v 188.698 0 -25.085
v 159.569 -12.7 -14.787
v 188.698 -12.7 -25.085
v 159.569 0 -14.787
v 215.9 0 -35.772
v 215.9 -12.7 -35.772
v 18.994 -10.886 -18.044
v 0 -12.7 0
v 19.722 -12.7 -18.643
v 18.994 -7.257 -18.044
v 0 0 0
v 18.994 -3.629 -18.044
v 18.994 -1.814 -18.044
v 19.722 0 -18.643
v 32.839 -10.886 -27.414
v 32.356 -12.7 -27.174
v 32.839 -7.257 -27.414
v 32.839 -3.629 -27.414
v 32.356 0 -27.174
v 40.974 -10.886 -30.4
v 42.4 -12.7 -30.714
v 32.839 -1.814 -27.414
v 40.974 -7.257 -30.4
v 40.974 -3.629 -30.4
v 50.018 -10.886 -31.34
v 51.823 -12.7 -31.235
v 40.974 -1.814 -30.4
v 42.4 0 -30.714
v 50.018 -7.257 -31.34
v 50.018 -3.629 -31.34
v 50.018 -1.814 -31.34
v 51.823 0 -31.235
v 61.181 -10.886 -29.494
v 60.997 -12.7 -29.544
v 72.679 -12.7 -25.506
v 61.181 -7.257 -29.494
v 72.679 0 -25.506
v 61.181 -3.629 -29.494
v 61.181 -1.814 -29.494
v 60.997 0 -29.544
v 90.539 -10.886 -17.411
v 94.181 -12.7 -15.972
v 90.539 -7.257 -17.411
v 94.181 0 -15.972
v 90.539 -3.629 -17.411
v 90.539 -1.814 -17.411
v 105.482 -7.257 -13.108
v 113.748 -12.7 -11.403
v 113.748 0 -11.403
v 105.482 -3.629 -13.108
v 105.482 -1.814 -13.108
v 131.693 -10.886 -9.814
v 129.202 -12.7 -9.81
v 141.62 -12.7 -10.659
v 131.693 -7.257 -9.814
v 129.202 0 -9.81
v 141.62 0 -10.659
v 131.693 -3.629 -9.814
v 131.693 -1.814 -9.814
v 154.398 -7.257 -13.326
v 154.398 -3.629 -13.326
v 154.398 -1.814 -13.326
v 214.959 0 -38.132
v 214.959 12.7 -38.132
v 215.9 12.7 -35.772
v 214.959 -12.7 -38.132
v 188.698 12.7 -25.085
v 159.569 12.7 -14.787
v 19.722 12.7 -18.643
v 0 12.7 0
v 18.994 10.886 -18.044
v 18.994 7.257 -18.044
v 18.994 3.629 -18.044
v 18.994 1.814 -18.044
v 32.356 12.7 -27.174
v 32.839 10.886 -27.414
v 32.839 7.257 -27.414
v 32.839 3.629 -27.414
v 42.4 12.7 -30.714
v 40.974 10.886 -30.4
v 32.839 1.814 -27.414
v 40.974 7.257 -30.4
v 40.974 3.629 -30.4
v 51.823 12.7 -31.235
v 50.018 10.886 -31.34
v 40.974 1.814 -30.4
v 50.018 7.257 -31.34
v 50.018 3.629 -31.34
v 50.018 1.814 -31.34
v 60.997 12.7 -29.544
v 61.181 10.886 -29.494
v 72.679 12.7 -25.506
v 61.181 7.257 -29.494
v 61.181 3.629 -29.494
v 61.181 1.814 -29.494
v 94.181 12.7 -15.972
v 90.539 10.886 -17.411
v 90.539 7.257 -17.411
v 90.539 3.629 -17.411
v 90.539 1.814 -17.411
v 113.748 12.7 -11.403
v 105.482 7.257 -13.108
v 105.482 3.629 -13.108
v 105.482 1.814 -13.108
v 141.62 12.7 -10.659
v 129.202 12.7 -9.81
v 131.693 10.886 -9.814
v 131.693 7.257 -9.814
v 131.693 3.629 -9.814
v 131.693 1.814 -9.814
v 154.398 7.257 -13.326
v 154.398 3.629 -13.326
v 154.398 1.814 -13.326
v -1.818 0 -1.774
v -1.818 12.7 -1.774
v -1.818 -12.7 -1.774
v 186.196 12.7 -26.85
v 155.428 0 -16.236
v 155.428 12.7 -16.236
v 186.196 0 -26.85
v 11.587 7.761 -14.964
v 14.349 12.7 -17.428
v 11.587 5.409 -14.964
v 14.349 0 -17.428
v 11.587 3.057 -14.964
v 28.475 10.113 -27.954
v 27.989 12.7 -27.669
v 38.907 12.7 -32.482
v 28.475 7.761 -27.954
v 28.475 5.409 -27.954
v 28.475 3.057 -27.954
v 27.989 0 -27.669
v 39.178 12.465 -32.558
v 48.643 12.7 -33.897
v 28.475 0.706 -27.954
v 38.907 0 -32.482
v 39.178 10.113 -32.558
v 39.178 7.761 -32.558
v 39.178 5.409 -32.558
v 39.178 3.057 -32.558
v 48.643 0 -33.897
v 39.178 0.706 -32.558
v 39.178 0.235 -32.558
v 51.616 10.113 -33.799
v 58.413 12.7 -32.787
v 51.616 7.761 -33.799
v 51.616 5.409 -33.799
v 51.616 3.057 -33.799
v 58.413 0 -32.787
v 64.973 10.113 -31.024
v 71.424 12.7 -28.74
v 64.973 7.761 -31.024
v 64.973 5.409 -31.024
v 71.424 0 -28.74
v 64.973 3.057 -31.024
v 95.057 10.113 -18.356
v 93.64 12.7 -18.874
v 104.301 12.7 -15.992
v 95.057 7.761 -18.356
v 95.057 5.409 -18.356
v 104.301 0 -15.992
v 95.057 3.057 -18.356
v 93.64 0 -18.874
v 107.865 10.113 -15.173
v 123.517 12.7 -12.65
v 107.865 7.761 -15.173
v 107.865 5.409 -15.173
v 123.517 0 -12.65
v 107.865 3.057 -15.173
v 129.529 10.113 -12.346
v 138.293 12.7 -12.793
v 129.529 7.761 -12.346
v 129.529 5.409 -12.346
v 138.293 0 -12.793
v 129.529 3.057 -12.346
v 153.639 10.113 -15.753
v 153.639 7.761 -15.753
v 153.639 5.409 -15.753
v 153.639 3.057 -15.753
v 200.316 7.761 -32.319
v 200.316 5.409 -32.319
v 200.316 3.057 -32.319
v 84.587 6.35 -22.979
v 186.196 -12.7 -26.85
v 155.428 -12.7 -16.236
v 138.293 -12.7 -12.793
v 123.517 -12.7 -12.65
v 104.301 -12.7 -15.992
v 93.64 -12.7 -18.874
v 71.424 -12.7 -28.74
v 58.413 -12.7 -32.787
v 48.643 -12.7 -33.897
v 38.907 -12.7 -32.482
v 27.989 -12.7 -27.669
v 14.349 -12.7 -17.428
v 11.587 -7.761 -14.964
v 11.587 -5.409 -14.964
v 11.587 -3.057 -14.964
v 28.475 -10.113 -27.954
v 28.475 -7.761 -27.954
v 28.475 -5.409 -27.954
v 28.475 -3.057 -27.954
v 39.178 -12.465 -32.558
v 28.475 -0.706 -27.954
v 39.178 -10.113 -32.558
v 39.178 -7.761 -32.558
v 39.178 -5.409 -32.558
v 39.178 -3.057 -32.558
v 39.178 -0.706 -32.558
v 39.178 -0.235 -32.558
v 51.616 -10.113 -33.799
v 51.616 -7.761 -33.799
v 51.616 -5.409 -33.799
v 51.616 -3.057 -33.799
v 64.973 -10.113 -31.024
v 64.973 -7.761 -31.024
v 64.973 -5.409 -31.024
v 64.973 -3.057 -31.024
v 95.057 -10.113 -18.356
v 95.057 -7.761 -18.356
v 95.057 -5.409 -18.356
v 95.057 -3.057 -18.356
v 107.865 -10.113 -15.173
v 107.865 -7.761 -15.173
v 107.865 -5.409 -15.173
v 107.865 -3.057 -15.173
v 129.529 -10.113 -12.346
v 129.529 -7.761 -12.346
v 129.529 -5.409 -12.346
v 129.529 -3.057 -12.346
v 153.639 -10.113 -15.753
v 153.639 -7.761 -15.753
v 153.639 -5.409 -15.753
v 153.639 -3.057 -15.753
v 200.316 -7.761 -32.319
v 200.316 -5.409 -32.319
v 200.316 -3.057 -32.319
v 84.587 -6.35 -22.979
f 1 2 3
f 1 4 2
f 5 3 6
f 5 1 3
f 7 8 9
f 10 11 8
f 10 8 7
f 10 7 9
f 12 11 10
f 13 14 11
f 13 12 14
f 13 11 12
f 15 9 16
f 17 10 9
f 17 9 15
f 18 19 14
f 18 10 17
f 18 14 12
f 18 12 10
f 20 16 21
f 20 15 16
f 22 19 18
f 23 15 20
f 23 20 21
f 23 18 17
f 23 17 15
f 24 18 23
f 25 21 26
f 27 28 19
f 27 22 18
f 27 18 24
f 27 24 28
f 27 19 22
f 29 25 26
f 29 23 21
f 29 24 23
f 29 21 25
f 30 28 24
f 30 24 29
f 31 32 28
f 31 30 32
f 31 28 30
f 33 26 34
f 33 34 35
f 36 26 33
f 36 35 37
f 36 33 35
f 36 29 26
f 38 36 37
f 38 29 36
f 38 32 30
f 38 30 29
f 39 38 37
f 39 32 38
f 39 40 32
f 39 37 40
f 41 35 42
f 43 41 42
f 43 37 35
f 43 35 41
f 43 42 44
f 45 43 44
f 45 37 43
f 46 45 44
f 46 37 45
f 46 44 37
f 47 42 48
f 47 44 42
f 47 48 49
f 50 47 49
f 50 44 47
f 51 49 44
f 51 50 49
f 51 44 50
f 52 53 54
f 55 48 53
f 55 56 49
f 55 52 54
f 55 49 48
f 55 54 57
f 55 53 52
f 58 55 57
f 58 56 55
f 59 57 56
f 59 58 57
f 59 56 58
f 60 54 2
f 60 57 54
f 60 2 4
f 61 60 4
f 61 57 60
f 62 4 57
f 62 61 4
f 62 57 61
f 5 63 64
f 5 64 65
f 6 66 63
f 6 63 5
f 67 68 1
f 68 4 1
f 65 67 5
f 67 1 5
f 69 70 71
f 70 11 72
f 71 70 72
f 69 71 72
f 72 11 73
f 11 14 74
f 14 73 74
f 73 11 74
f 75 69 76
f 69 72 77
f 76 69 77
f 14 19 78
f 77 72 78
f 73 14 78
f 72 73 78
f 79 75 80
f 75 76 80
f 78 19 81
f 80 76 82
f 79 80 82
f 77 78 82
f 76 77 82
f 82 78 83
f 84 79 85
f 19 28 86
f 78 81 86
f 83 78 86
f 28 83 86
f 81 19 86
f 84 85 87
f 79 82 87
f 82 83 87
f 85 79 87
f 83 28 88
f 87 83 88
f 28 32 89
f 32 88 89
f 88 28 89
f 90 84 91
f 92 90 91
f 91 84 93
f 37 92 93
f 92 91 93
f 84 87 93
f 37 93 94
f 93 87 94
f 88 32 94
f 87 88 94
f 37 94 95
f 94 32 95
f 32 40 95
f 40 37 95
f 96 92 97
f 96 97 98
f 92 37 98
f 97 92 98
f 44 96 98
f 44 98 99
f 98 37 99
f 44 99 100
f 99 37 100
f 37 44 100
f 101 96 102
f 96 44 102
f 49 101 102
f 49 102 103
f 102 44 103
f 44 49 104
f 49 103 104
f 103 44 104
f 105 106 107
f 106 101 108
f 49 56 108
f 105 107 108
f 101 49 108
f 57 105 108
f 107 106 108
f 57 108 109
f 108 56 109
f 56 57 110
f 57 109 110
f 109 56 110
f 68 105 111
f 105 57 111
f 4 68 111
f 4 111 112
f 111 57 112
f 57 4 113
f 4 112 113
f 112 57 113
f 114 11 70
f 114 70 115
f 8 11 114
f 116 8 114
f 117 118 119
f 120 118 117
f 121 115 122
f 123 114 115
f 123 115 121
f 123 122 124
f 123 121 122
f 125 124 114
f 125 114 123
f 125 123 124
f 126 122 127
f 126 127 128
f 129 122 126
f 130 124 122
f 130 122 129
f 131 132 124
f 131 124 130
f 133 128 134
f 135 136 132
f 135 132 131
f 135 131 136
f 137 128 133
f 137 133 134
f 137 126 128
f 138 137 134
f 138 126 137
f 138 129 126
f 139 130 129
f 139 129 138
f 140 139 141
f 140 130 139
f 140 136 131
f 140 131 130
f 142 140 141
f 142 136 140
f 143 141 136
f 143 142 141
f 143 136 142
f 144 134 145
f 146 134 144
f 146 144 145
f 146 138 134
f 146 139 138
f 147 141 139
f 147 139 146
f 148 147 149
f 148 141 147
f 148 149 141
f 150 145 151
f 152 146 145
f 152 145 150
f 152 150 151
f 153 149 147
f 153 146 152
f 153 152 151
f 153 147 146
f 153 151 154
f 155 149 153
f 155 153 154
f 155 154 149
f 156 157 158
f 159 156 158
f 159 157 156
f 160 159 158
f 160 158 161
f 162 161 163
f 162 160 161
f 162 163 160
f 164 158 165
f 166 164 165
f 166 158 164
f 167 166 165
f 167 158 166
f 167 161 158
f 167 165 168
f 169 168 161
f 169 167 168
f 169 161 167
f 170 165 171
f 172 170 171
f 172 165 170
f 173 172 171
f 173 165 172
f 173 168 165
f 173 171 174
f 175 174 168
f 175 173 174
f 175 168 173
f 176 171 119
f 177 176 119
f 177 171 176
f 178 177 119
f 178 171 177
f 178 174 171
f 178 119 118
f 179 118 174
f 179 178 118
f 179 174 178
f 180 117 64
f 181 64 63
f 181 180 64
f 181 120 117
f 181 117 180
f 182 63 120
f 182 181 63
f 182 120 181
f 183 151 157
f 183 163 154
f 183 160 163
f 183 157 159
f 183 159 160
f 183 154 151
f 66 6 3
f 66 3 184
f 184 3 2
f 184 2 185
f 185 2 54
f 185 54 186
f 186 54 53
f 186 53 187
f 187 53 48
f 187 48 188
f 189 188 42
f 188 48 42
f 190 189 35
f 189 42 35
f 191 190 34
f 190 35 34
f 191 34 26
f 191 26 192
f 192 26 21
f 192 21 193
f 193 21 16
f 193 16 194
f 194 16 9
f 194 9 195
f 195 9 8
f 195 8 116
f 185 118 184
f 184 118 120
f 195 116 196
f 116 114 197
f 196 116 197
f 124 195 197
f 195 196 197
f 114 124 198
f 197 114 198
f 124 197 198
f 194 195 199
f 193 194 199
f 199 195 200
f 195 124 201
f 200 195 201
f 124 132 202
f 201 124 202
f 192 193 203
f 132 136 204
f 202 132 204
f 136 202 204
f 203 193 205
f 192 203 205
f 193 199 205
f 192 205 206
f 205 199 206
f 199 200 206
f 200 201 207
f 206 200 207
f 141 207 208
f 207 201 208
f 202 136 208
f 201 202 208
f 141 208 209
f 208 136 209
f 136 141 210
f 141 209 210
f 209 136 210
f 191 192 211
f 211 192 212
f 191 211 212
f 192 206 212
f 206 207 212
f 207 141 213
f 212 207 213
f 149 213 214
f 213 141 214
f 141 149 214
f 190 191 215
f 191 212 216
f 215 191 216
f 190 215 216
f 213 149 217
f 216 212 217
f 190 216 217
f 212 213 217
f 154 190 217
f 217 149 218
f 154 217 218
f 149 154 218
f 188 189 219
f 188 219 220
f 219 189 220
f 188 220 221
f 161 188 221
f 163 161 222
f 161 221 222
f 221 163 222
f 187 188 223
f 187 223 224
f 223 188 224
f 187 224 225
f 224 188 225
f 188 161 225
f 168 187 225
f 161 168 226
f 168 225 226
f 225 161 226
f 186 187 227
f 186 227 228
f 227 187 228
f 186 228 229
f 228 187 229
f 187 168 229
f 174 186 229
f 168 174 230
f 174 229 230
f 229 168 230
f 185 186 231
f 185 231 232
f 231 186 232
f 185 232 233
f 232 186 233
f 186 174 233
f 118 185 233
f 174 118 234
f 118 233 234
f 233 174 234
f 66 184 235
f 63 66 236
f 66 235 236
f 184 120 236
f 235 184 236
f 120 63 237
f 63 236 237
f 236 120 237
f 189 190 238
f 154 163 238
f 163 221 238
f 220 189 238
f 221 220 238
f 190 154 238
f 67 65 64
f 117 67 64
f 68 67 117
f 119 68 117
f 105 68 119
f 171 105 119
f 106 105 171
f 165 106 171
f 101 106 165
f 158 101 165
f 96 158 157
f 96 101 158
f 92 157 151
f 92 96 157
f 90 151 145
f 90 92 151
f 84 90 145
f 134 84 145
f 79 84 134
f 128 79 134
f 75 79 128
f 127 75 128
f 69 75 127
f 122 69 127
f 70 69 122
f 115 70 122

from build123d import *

# Parameters (mm, degrees)
F1_DEPTH = 12.7


# Not quite as in the source:
# - the dataset's text gives a spline's control points without its knots; the knots are read off the source's solid


with BuildPart() as f1:
    # F0 (on Front) → F1 (new body, symmetric)
    with BuildSketch(Plane.XZ):
        with BuildLine():
            add(Edge.make_bspline(
                [(0, 0), (5.8612335558, -6.0081148845), (18.3752479061, -18.835727906), (48.6654628653, -39.4932987315), (90.7530364795, -16.3272004333), (100.2814212382, -14.4870542481), (133.9403129455, -5.8103101016), (177.0386623069, -20.2782140016), (203.1498632313, -30.6887883047), (215.9, -35.7722866313)],
                knots=[0, 0, 0, 0, 0.129200241, 0.2758487022, 0.4410783086, 0.5233117279, 0.6646184967, 0.8362327321, 1, 1, 1, 1], degree=3))
            Line((0, 0), (-1.8181378704, -1.7736895682))
            add(Edge.make_bspline(
                [(-1.8181378704, -1.7736895682), (-0.4004659897, -3.2268880198), (2.4431142587, -6.1417829598), (6.8524053688, -10.5397610564), (10.7452755589, -14.2238690349), (14.0488962473, -17.1803558766), (16.2049401321, -19.0314128088), (17.9909210379, -20.5139707911), (19.8270649964, -21.9999559385), (22.2173956321, -23.8441638172), (25.2463744879, -25.9812516301), (28.4448239666, -27.9859413981), (31.822064763, -29.800697673), (35.386785102, -31.3660245692), (39.1456242468, -32.6202945152), (43.1015831462, -33.5005010422), (46.5604299892, -33.8694850047), (49.4218512492, -33.9167847472), (52.3425650521, -33.7869733676), (56.0409974594, -33.3140712632), (60.5186857591, -32.3465436646), (64.9836248523, -31.0633291737), (70.8500377765, -29.0399456974), (76.4748344801, -26.7059871293), (81.6189172058, -24.3744110822), (85.1730897504, -22.7052323037), (88.3552510159, -21.1961987948), (91.0972845141, -19.9257389393), (93.2887984197, -18.9941161488), (95.0891241303, -18.328556452), (96.6943622555, -17.8301427153), (98.0469088091, -17.4773372304), (99.2348494878, -17.1912683069), (100.197658958, -16.9654717597), (101.2546580452, -16.7179356412), (102.7954830873, -16.3504470242), (104.9344979714, -15.838506122), (107.8186019956, -15.175008387), (110.9802371747, -14.5008751611), (115.5133801016, -13.638792825), (120.4408484671, -12.9087974948), (125.5919935924, -12.463994437), (129.5259656126, -12.3090764437), (133.478060473, -12.3745703184), (137.4668709198, -12.6718476795), (141.4854505796, -13.175598953), (146.8725262766, -14.0979489105), (153.6404353633, -15.6692951637), (161.751337364, -18.0572248428), (169.7870128362, -20.7779992509), (177.689922634, -23.6529231388), (185.385108931, -26.529489533), (192.9176973961, -29.4196277885), (200.3292495735, -32.3175899877), (207.6621539732, -35.2222962334), (212.5263337706, -37.1616414275), (214.9593094143, -38.1316724035)],
                knots=[0, 0, 0, 0, 0.03125, 0.0625, 0.09375, 0.109375, 0.125, 0.1328125, 0.140625, 0.15625, 0.171875, 0.1875, 0.203125, 0.21875, 0.234375, 0.25, 0.265625, 0.2734375, 0.28125, 0.296875, 0.3125, 0.328125, 0.34375, 0.375, 0.390625, 0.40625, 0.421875, 0.4375, 0.453125, 0.46875, 0.484375, 0.5, 0.5078125, 0.515625, 0.5234375, 0.53125, 0.546875, 0.5625, 0.578125, 0.59375, 0.625, 0.640625, 0.65625, 0.671875, 0.6875, 0.703125, 0.71875, 0.75, 0.78125, 0.8125, 0.84375, 0.875, 0.90625, 0.9375, 0.96875, 1, 1, 1, 1], degree=3))
            Line((214.9593094143, -38.1316724035), (215.9, -35.7722866313))
        make_face()
    extrude(amount=F1_DEPTH, both=True)


solid = f1.part
